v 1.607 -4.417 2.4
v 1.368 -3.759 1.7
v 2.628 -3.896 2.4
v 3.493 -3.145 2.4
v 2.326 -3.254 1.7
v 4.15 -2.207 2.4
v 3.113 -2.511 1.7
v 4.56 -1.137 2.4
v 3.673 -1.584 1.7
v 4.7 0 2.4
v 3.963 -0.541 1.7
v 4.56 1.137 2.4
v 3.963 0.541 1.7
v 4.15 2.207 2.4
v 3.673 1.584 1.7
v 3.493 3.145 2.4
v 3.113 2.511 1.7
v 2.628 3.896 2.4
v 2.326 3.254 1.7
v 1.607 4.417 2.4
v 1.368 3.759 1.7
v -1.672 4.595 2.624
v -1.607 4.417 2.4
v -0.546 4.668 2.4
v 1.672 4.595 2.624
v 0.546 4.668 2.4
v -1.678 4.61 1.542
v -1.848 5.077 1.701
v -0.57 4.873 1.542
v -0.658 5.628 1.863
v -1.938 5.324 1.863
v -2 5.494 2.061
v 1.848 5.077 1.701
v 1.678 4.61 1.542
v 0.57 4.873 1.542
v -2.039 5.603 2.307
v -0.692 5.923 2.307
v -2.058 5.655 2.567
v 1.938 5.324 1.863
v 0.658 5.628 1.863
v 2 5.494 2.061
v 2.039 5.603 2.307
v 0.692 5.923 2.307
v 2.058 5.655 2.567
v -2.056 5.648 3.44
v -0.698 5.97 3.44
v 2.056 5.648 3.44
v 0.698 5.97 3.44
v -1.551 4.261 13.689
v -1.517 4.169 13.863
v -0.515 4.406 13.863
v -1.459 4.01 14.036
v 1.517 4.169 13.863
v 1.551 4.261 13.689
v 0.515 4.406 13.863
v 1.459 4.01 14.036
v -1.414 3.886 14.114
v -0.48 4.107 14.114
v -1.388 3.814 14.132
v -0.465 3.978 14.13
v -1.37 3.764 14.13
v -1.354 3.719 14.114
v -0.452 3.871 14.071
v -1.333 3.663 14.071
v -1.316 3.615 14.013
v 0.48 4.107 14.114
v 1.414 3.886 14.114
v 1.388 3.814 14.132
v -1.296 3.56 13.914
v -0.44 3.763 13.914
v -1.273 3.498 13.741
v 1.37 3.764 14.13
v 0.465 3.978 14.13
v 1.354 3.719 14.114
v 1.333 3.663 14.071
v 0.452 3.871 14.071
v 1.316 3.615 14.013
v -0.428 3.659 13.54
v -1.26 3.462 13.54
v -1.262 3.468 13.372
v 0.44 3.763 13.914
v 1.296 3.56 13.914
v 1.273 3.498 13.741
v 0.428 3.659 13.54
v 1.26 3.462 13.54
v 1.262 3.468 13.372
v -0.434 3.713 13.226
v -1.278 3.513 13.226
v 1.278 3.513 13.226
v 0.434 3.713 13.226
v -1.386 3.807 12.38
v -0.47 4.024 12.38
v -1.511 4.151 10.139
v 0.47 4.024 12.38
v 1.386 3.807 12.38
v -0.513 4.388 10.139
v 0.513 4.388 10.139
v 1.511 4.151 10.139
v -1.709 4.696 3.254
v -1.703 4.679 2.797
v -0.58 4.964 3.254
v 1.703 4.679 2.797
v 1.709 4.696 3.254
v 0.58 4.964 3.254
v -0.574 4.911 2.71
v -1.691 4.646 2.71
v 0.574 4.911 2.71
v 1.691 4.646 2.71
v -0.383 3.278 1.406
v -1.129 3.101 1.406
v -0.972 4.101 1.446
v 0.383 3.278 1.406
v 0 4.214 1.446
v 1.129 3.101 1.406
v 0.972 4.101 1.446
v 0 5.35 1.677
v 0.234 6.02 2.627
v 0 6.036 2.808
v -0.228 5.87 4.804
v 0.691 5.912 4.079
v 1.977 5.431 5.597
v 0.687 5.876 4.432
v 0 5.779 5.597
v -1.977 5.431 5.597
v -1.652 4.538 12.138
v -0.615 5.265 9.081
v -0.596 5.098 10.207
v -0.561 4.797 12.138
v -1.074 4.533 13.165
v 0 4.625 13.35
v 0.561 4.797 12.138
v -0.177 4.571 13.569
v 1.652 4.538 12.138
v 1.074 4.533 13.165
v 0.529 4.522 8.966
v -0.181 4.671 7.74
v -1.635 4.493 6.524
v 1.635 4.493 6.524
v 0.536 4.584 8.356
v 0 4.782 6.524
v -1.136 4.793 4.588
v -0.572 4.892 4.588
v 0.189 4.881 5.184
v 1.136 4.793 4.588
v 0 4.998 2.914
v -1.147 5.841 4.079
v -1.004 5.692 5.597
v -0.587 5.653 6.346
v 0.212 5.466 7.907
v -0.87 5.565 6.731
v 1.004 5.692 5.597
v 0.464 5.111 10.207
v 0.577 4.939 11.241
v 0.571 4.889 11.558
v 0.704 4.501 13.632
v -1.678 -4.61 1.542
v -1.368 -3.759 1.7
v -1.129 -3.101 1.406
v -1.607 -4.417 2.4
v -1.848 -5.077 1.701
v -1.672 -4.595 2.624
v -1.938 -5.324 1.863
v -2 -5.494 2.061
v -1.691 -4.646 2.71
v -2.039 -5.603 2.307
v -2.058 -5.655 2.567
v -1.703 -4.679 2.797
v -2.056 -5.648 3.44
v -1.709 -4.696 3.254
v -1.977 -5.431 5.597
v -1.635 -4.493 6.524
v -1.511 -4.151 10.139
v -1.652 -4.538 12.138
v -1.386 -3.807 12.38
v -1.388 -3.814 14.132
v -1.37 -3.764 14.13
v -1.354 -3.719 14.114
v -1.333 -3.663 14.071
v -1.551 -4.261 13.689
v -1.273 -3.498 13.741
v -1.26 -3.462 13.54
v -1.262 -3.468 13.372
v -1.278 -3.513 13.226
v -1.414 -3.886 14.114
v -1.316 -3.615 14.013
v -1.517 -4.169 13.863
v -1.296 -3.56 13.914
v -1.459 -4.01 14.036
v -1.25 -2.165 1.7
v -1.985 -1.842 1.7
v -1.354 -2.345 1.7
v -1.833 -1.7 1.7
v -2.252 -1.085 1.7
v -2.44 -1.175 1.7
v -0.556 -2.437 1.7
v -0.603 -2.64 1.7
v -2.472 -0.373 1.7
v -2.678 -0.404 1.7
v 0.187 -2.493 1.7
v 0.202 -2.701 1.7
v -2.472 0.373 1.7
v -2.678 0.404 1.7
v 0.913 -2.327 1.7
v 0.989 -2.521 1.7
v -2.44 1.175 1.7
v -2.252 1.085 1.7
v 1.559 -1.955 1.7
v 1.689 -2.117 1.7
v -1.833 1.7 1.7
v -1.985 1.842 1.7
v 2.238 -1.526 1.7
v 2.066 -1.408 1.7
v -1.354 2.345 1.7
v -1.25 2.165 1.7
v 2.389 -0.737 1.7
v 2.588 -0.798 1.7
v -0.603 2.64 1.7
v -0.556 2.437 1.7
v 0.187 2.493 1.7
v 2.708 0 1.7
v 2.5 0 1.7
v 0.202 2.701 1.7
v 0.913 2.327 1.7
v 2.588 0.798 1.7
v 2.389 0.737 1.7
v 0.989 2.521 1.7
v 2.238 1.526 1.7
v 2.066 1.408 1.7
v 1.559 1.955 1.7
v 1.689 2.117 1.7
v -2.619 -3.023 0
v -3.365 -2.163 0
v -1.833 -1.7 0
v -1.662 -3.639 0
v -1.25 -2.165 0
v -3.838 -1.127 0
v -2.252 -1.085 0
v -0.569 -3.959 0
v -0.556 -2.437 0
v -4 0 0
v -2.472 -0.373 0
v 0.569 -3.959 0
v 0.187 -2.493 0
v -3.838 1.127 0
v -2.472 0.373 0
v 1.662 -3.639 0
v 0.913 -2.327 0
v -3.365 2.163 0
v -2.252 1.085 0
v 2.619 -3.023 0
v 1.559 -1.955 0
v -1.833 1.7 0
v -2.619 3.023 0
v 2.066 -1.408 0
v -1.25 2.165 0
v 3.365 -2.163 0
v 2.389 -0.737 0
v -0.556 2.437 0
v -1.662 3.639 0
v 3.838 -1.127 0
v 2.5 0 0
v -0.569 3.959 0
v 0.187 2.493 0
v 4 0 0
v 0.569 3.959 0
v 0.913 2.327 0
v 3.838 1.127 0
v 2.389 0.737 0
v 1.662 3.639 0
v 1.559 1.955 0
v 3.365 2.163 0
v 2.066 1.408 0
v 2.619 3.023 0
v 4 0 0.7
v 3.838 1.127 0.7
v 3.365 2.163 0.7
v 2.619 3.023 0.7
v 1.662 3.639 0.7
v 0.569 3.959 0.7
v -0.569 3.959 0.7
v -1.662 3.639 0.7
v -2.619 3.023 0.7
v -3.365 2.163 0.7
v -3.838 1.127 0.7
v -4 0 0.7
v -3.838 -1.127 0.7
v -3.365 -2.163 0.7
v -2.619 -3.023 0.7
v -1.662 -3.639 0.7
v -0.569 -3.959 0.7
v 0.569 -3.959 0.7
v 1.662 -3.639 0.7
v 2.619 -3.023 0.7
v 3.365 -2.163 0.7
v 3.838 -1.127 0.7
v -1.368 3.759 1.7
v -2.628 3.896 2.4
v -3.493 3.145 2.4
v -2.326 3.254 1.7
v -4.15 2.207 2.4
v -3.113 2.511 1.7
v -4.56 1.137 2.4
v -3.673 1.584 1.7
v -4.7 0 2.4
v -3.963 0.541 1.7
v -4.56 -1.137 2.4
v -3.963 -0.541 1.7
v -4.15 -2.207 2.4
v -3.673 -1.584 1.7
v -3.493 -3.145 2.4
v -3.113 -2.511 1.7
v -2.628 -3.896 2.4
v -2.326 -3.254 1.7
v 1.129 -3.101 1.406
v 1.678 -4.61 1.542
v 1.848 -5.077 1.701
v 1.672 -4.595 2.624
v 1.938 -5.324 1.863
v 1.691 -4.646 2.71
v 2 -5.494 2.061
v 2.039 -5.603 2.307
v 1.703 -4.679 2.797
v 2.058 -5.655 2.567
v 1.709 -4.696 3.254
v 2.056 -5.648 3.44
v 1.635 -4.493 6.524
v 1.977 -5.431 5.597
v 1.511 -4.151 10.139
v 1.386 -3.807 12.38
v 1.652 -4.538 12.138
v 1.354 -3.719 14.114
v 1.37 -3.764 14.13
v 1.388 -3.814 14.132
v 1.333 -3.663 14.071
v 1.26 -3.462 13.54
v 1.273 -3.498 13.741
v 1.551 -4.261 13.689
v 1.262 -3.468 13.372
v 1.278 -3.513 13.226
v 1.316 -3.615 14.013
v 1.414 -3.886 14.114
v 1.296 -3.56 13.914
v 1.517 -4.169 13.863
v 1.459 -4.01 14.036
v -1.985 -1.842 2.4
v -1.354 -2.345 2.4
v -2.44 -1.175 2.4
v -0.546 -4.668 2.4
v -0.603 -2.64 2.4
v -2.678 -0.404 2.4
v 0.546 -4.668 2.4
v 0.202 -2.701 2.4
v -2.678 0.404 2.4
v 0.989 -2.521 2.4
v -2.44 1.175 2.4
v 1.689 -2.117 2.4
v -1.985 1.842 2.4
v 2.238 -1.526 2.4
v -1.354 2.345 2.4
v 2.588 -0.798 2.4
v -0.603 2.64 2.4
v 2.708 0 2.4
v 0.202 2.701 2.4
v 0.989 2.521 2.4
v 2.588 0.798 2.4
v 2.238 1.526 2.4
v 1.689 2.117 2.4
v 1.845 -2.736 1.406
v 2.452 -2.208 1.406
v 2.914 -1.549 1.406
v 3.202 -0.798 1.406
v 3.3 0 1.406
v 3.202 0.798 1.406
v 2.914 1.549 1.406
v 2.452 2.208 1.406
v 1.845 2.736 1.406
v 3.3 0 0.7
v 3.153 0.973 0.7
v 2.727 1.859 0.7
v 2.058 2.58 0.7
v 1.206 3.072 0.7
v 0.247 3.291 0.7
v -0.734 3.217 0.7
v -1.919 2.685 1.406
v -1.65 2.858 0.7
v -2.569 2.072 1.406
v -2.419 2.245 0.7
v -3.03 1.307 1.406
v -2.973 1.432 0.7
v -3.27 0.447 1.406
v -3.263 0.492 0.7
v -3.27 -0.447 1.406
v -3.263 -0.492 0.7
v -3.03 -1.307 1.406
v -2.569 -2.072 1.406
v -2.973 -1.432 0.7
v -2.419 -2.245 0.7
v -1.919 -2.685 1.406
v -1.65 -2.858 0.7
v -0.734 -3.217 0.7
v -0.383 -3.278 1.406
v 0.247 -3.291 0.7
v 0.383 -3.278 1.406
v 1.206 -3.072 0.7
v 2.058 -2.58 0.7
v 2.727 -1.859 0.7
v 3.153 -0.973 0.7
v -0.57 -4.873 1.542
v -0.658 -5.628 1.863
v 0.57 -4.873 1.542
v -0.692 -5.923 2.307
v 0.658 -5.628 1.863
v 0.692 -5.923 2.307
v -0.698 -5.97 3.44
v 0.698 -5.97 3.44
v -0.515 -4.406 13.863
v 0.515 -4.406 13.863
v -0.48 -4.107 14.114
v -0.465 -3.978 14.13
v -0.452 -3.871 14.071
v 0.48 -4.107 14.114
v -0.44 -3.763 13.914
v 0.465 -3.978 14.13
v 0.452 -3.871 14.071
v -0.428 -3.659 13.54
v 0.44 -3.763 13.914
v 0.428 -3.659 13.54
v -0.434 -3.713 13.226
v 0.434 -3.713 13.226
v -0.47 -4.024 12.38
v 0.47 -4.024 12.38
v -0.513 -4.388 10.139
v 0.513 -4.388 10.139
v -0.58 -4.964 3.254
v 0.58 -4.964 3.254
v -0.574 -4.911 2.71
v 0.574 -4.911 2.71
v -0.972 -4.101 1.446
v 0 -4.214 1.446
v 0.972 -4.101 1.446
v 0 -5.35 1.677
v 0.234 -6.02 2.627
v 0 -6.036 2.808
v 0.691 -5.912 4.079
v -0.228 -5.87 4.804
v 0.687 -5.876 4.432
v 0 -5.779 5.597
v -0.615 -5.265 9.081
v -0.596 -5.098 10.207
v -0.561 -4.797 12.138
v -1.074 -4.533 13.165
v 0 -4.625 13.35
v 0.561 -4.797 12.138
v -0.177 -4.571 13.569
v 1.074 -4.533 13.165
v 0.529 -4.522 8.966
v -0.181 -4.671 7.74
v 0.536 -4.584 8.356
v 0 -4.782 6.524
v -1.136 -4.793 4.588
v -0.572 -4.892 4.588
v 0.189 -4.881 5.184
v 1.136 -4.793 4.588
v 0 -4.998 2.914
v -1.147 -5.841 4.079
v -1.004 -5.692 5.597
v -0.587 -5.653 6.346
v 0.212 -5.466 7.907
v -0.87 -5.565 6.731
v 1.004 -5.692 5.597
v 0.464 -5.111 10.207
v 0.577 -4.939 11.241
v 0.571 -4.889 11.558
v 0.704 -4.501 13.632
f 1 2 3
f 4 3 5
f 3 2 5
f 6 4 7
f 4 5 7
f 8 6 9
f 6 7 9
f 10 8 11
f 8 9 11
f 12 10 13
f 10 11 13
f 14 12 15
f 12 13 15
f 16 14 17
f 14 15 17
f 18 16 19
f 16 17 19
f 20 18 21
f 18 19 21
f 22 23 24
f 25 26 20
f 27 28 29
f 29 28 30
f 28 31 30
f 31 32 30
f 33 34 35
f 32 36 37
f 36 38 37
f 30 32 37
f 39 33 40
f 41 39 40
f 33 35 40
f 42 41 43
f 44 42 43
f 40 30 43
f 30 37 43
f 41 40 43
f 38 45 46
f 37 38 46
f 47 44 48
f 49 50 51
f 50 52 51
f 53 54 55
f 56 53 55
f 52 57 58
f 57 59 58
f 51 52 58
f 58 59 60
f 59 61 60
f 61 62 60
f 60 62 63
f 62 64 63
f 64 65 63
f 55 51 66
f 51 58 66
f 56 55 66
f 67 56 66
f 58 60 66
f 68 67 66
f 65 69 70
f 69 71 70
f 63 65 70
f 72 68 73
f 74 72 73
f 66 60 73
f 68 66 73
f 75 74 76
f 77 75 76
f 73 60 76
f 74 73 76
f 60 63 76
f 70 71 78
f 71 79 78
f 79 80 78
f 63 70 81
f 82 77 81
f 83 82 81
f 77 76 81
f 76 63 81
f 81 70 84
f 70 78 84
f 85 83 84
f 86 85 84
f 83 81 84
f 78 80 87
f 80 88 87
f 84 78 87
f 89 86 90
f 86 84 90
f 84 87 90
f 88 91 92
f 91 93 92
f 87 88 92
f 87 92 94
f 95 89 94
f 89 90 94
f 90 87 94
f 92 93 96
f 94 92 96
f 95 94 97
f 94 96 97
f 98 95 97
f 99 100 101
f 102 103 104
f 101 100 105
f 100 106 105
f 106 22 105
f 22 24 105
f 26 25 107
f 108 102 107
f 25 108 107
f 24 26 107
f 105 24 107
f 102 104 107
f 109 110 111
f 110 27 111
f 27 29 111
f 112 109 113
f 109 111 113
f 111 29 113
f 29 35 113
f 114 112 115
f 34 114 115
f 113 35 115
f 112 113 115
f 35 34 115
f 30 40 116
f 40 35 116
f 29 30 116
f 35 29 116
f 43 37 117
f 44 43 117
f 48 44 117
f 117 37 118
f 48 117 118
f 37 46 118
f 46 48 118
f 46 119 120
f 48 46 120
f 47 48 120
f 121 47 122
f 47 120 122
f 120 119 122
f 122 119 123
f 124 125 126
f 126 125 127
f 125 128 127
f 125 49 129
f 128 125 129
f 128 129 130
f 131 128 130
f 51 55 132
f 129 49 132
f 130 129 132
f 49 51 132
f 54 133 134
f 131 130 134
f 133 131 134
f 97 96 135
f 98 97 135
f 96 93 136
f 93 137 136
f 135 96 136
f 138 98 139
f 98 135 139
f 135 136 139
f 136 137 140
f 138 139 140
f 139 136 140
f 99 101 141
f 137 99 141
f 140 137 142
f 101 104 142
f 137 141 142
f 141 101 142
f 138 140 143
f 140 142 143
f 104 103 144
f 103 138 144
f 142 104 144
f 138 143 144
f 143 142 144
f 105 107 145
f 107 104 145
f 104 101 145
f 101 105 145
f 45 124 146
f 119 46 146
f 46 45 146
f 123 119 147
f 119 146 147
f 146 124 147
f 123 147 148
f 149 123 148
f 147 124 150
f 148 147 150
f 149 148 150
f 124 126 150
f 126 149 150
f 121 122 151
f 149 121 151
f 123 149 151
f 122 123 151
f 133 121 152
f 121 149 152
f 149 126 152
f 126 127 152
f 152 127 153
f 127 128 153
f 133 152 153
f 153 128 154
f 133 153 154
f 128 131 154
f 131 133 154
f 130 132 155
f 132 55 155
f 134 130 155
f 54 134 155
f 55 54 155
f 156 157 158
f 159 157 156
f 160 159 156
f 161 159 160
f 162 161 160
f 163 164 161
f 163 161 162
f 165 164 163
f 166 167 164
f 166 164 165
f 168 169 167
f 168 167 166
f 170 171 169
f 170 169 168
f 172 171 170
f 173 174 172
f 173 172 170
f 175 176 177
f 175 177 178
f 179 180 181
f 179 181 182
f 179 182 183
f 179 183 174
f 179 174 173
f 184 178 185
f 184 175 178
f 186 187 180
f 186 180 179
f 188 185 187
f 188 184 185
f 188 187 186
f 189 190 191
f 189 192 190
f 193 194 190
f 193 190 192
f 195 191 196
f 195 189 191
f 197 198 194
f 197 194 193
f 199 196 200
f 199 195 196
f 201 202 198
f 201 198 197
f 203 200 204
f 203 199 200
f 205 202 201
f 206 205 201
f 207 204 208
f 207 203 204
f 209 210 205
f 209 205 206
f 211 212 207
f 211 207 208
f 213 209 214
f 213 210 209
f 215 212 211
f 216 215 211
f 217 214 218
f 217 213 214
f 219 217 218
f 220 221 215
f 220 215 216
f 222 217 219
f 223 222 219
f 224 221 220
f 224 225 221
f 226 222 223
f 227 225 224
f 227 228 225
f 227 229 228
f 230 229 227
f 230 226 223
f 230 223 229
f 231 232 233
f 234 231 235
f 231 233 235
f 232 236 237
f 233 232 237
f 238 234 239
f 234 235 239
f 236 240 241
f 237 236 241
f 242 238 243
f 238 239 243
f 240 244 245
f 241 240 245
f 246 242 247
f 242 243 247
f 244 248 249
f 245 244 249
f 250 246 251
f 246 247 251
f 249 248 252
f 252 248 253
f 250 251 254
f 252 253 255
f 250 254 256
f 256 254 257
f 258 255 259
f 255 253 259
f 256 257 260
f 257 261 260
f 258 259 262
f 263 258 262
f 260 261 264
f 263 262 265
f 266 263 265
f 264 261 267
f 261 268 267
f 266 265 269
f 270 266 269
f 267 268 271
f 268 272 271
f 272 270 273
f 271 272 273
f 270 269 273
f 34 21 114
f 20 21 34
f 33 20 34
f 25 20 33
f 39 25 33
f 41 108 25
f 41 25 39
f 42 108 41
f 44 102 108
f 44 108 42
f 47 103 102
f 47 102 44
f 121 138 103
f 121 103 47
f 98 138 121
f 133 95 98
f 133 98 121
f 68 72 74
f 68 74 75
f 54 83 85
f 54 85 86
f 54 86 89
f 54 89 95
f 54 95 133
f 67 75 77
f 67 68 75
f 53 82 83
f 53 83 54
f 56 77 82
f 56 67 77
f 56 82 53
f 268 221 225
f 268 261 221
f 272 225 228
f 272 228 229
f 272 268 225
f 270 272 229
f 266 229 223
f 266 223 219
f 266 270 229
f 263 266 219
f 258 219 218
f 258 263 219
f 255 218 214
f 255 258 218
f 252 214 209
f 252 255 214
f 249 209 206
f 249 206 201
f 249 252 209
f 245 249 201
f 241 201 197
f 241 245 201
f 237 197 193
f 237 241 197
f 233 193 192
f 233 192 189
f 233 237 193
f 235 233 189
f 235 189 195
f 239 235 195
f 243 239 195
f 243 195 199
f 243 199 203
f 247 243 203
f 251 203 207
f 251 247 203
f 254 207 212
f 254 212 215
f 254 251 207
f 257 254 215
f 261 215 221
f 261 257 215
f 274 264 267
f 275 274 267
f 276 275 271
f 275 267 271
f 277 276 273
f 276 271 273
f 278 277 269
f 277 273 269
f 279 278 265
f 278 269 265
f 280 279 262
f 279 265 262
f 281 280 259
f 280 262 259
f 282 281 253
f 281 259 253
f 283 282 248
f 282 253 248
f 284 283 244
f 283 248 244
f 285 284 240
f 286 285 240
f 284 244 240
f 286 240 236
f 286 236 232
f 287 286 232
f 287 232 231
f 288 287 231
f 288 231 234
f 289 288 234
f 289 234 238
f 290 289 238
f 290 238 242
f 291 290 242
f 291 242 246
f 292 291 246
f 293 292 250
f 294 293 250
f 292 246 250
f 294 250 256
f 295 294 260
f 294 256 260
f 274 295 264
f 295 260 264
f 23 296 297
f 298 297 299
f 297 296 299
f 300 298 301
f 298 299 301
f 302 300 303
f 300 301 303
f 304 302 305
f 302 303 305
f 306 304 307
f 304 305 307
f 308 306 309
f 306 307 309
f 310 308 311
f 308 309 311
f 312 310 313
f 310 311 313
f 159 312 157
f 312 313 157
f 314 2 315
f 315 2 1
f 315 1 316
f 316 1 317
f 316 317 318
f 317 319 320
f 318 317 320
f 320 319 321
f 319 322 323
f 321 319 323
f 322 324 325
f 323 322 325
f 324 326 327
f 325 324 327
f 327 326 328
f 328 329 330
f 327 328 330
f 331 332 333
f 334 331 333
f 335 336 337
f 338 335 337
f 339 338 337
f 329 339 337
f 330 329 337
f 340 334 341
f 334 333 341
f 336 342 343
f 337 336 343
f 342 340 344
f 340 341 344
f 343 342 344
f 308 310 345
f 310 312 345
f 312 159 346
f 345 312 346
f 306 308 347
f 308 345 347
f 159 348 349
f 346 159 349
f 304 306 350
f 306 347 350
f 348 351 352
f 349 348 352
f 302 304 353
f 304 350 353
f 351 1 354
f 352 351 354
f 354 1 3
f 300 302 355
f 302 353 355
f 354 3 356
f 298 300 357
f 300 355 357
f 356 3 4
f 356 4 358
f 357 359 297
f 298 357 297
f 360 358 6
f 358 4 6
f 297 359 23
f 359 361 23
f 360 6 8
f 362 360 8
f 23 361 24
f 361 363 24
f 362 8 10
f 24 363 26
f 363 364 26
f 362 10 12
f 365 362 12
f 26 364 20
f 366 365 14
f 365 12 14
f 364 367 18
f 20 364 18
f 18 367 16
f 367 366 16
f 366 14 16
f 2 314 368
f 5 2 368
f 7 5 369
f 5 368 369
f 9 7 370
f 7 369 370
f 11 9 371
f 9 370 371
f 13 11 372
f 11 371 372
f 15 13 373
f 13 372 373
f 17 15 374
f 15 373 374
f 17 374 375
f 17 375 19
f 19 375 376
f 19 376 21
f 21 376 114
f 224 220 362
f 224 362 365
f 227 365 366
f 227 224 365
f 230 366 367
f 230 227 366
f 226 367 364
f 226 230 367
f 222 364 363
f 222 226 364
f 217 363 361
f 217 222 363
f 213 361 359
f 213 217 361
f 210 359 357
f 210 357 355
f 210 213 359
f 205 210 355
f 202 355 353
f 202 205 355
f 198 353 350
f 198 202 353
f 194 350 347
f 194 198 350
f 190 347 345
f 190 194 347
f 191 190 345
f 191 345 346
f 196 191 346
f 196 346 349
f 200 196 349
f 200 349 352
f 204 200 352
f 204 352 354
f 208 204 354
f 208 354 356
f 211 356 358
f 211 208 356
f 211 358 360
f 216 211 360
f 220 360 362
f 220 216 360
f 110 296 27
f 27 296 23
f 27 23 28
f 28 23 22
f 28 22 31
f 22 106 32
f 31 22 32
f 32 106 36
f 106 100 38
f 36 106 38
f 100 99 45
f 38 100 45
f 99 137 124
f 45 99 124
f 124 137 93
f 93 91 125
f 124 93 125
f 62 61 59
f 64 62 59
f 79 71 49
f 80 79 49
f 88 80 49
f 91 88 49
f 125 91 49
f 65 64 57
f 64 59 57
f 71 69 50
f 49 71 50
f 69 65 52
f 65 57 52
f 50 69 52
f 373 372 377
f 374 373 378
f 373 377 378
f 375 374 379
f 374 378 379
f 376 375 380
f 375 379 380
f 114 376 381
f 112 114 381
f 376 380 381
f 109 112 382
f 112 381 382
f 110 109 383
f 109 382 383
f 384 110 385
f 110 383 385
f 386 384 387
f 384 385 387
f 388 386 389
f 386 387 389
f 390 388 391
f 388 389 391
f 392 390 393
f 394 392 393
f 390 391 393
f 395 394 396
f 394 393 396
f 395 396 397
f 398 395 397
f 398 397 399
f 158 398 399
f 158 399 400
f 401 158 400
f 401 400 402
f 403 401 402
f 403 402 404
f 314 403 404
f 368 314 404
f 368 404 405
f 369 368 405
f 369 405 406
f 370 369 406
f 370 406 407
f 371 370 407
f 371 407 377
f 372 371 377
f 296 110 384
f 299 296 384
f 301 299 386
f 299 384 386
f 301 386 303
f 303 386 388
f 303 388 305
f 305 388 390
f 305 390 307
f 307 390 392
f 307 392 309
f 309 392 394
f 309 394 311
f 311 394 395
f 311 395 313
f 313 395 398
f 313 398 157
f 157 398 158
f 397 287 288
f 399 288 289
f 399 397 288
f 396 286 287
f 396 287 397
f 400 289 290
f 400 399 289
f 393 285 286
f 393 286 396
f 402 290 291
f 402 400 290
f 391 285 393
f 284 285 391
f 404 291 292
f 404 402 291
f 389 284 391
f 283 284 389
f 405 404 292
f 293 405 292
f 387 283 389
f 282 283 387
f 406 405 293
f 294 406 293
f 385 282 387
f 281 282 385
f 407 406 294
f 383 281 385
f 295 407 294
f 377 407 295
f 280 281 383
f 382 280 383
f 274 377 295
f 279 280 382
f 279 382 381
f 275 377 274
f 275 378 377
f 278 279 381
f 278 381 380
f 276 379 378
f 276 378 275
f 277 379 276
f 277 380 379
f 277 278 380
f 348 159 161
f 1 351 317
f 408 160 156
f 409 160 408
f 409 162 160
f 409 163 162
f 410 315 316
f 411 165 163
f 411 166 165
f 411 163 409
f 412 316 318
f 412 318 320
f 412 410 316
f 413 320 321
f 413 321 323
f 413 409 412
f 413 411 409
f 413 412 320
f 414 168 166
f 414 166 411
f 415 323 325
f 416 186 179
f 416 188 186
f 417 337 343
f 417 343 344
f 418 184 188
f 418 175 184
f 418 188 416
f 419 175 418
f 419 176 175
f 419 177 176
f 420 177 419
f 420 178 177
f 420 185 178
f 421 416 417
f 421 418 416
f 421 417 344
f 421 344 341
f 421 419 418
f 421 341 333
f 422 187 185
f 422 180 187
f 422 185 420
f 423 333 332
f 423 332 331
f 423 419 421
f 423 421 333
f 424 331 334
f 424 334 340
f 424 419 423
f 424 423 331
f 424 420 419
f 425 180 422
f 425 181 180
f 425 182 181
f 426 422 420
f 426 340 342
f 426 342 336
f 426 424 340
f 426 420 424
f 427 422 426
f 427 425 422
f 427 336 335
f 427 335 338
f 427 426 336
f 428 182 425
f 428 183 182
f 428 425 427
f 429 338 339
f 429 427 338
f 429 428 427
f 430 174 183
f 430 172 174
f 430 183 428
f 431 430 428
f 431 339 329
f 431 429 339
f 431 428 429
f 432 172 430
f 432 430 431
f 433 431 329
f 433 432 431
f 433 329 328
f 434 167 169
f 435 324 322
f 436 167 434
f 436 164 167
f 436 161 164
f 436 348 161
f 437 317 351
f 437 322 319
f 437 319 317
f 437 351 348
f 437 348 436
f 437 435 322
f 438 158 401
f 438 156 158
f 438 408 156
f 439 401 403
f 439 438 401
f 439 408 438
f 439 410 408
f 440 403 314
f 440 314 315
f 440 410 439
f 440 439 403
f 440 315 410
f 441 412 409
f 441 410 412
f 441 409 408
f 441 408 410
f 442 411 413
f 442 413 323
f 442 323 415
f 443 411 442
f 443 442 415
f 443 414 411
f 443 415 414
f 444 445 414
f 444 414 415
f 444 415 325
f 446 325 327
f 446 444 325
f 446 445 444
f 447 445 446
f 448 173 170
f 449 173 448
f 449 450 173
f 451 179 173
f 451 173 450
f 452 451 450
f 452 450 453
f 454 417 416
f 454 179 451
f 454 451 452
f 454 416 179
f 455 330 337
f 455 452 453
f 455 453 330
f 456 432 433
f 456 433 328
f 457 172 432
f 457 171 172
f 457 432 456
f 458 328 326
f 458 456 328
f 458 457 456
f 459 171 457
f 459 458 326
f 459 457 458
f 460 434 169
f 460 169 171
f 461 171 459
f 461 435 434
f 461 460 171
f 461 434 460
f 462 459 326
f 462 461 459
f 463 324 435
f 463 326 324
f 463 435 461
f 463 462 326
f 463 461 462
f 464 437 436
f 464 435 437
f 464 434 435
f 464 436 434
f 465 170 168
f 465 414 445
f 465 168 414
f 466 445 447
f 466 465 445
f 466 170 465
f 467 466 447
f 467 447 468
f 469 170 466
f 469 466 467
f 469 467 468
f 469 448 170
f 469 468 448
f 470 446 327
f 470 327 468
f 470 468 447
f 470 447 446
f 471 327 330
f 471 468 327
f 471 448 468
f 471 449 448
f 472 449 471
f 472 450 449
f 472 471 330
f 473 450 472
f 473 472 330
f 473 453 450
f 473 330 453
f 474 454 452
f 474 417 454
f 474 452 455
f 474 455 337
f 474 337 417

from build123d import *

# Parameters (mm, degrees)
F0_R          = 4
F0_R_2        = 2.5
F1_DEPTH      = 0.7
F2_R          = 3.3
F2_R_2        = 2.5
F3_DEPTH      = 1
F4_R          = 4
F4_R_2        = 2.7082847247
F5_DEPTH      = 0.7
F9_ANGLE_BACK = 20
F9_ANGLE      = 40


with BuildPart() as f1:
    # F0 (on Top) → F1 (new body)
    with BuildSketch(Plane.XY):
        Circle(F0_R)
        Circle(F0_R_2, mode=Mode.SUBTRACT)
    extrude(amount=F1_DEPTH)

    # F2 (on face) → F3 (join)
    with BuildSketch(Plane.XY.offset(0.7)):
        Circle(F2_R)
        Circle(F2_R_2, mode=Mode.SUBTRACT)
    extrude(amount=F3_DEPTH)

    # F4 (on face) → F5 (join)
    with BuildSketch(Plane.XY.offset(1.7)):
        Circle(F4_R)
        Circle(F4_R_2, mode=Mode.SUBTRACT)
    extrude(amount=F5_DEPTH)

    # F6 (on Right) → F7 (revolve)
    with BuildSketch(Plane.YZ):
        Polygon((-4, 1.7), (-4, 2.4), (-4.7, 2.4), align=None)
        Polygon((-3.3, 1.7), (-4, 1.7), (-3.3, 1.4059272362), align=None)
    revolve(axis=Axis((0, 0, 2.4), (0, 0, 1)))

    # F8 (on Right) → F9 (revolve)
    with BuildSketch(Plane.YZ, mode=Mode.PRIVATE) as f9_sk:
        with BuildLine():
            add(Edge.make_bspline(
                [(-3.3, 1.4059272362), (-6.0468855435, 1.441646311), (-6.2736891755, 2.9814417815), (-4.7089018779, 13.0197805627), (-4.5280783622, 13.8493191708), (-3.9012755567, 14.3429894387), (-3.5414669526, 13.2946596808), (-4.3496219383, 12.8327032699), (-5.097212262, 2.7888434187), (-4.9865280125, 2.7266615906), (-4.7, 2.4)],
                knots=[0, 0, 0, 0, 0.1500571493, 0.3998382837, 0.4758785019, 0.5317203727, 0.5995110586, 0.6784641499, 0.9265496454, 1, 1, 1, 1], degree=3))
            Line((-3.3, 1.4059272362), (-4, 1.7))
            Line((-4, 1.7), (-4.7, 2.4))
        make_face()
    revolve(f9_sk.sketch.rotate(Axis((0, 0, 2.4), (0, 0, 1)), -F9_ANGLE_BACK), axis=Axis((0, 0, 2.4), (0, 0, 1)), revolution_arc=F9_ANGLE)

    # F10: F1 across plane


with BuildPart() as f1_1:
    add(f1.part)
    add(f1.part.mirror(Plane.XZ))


solid = f1_1.part
